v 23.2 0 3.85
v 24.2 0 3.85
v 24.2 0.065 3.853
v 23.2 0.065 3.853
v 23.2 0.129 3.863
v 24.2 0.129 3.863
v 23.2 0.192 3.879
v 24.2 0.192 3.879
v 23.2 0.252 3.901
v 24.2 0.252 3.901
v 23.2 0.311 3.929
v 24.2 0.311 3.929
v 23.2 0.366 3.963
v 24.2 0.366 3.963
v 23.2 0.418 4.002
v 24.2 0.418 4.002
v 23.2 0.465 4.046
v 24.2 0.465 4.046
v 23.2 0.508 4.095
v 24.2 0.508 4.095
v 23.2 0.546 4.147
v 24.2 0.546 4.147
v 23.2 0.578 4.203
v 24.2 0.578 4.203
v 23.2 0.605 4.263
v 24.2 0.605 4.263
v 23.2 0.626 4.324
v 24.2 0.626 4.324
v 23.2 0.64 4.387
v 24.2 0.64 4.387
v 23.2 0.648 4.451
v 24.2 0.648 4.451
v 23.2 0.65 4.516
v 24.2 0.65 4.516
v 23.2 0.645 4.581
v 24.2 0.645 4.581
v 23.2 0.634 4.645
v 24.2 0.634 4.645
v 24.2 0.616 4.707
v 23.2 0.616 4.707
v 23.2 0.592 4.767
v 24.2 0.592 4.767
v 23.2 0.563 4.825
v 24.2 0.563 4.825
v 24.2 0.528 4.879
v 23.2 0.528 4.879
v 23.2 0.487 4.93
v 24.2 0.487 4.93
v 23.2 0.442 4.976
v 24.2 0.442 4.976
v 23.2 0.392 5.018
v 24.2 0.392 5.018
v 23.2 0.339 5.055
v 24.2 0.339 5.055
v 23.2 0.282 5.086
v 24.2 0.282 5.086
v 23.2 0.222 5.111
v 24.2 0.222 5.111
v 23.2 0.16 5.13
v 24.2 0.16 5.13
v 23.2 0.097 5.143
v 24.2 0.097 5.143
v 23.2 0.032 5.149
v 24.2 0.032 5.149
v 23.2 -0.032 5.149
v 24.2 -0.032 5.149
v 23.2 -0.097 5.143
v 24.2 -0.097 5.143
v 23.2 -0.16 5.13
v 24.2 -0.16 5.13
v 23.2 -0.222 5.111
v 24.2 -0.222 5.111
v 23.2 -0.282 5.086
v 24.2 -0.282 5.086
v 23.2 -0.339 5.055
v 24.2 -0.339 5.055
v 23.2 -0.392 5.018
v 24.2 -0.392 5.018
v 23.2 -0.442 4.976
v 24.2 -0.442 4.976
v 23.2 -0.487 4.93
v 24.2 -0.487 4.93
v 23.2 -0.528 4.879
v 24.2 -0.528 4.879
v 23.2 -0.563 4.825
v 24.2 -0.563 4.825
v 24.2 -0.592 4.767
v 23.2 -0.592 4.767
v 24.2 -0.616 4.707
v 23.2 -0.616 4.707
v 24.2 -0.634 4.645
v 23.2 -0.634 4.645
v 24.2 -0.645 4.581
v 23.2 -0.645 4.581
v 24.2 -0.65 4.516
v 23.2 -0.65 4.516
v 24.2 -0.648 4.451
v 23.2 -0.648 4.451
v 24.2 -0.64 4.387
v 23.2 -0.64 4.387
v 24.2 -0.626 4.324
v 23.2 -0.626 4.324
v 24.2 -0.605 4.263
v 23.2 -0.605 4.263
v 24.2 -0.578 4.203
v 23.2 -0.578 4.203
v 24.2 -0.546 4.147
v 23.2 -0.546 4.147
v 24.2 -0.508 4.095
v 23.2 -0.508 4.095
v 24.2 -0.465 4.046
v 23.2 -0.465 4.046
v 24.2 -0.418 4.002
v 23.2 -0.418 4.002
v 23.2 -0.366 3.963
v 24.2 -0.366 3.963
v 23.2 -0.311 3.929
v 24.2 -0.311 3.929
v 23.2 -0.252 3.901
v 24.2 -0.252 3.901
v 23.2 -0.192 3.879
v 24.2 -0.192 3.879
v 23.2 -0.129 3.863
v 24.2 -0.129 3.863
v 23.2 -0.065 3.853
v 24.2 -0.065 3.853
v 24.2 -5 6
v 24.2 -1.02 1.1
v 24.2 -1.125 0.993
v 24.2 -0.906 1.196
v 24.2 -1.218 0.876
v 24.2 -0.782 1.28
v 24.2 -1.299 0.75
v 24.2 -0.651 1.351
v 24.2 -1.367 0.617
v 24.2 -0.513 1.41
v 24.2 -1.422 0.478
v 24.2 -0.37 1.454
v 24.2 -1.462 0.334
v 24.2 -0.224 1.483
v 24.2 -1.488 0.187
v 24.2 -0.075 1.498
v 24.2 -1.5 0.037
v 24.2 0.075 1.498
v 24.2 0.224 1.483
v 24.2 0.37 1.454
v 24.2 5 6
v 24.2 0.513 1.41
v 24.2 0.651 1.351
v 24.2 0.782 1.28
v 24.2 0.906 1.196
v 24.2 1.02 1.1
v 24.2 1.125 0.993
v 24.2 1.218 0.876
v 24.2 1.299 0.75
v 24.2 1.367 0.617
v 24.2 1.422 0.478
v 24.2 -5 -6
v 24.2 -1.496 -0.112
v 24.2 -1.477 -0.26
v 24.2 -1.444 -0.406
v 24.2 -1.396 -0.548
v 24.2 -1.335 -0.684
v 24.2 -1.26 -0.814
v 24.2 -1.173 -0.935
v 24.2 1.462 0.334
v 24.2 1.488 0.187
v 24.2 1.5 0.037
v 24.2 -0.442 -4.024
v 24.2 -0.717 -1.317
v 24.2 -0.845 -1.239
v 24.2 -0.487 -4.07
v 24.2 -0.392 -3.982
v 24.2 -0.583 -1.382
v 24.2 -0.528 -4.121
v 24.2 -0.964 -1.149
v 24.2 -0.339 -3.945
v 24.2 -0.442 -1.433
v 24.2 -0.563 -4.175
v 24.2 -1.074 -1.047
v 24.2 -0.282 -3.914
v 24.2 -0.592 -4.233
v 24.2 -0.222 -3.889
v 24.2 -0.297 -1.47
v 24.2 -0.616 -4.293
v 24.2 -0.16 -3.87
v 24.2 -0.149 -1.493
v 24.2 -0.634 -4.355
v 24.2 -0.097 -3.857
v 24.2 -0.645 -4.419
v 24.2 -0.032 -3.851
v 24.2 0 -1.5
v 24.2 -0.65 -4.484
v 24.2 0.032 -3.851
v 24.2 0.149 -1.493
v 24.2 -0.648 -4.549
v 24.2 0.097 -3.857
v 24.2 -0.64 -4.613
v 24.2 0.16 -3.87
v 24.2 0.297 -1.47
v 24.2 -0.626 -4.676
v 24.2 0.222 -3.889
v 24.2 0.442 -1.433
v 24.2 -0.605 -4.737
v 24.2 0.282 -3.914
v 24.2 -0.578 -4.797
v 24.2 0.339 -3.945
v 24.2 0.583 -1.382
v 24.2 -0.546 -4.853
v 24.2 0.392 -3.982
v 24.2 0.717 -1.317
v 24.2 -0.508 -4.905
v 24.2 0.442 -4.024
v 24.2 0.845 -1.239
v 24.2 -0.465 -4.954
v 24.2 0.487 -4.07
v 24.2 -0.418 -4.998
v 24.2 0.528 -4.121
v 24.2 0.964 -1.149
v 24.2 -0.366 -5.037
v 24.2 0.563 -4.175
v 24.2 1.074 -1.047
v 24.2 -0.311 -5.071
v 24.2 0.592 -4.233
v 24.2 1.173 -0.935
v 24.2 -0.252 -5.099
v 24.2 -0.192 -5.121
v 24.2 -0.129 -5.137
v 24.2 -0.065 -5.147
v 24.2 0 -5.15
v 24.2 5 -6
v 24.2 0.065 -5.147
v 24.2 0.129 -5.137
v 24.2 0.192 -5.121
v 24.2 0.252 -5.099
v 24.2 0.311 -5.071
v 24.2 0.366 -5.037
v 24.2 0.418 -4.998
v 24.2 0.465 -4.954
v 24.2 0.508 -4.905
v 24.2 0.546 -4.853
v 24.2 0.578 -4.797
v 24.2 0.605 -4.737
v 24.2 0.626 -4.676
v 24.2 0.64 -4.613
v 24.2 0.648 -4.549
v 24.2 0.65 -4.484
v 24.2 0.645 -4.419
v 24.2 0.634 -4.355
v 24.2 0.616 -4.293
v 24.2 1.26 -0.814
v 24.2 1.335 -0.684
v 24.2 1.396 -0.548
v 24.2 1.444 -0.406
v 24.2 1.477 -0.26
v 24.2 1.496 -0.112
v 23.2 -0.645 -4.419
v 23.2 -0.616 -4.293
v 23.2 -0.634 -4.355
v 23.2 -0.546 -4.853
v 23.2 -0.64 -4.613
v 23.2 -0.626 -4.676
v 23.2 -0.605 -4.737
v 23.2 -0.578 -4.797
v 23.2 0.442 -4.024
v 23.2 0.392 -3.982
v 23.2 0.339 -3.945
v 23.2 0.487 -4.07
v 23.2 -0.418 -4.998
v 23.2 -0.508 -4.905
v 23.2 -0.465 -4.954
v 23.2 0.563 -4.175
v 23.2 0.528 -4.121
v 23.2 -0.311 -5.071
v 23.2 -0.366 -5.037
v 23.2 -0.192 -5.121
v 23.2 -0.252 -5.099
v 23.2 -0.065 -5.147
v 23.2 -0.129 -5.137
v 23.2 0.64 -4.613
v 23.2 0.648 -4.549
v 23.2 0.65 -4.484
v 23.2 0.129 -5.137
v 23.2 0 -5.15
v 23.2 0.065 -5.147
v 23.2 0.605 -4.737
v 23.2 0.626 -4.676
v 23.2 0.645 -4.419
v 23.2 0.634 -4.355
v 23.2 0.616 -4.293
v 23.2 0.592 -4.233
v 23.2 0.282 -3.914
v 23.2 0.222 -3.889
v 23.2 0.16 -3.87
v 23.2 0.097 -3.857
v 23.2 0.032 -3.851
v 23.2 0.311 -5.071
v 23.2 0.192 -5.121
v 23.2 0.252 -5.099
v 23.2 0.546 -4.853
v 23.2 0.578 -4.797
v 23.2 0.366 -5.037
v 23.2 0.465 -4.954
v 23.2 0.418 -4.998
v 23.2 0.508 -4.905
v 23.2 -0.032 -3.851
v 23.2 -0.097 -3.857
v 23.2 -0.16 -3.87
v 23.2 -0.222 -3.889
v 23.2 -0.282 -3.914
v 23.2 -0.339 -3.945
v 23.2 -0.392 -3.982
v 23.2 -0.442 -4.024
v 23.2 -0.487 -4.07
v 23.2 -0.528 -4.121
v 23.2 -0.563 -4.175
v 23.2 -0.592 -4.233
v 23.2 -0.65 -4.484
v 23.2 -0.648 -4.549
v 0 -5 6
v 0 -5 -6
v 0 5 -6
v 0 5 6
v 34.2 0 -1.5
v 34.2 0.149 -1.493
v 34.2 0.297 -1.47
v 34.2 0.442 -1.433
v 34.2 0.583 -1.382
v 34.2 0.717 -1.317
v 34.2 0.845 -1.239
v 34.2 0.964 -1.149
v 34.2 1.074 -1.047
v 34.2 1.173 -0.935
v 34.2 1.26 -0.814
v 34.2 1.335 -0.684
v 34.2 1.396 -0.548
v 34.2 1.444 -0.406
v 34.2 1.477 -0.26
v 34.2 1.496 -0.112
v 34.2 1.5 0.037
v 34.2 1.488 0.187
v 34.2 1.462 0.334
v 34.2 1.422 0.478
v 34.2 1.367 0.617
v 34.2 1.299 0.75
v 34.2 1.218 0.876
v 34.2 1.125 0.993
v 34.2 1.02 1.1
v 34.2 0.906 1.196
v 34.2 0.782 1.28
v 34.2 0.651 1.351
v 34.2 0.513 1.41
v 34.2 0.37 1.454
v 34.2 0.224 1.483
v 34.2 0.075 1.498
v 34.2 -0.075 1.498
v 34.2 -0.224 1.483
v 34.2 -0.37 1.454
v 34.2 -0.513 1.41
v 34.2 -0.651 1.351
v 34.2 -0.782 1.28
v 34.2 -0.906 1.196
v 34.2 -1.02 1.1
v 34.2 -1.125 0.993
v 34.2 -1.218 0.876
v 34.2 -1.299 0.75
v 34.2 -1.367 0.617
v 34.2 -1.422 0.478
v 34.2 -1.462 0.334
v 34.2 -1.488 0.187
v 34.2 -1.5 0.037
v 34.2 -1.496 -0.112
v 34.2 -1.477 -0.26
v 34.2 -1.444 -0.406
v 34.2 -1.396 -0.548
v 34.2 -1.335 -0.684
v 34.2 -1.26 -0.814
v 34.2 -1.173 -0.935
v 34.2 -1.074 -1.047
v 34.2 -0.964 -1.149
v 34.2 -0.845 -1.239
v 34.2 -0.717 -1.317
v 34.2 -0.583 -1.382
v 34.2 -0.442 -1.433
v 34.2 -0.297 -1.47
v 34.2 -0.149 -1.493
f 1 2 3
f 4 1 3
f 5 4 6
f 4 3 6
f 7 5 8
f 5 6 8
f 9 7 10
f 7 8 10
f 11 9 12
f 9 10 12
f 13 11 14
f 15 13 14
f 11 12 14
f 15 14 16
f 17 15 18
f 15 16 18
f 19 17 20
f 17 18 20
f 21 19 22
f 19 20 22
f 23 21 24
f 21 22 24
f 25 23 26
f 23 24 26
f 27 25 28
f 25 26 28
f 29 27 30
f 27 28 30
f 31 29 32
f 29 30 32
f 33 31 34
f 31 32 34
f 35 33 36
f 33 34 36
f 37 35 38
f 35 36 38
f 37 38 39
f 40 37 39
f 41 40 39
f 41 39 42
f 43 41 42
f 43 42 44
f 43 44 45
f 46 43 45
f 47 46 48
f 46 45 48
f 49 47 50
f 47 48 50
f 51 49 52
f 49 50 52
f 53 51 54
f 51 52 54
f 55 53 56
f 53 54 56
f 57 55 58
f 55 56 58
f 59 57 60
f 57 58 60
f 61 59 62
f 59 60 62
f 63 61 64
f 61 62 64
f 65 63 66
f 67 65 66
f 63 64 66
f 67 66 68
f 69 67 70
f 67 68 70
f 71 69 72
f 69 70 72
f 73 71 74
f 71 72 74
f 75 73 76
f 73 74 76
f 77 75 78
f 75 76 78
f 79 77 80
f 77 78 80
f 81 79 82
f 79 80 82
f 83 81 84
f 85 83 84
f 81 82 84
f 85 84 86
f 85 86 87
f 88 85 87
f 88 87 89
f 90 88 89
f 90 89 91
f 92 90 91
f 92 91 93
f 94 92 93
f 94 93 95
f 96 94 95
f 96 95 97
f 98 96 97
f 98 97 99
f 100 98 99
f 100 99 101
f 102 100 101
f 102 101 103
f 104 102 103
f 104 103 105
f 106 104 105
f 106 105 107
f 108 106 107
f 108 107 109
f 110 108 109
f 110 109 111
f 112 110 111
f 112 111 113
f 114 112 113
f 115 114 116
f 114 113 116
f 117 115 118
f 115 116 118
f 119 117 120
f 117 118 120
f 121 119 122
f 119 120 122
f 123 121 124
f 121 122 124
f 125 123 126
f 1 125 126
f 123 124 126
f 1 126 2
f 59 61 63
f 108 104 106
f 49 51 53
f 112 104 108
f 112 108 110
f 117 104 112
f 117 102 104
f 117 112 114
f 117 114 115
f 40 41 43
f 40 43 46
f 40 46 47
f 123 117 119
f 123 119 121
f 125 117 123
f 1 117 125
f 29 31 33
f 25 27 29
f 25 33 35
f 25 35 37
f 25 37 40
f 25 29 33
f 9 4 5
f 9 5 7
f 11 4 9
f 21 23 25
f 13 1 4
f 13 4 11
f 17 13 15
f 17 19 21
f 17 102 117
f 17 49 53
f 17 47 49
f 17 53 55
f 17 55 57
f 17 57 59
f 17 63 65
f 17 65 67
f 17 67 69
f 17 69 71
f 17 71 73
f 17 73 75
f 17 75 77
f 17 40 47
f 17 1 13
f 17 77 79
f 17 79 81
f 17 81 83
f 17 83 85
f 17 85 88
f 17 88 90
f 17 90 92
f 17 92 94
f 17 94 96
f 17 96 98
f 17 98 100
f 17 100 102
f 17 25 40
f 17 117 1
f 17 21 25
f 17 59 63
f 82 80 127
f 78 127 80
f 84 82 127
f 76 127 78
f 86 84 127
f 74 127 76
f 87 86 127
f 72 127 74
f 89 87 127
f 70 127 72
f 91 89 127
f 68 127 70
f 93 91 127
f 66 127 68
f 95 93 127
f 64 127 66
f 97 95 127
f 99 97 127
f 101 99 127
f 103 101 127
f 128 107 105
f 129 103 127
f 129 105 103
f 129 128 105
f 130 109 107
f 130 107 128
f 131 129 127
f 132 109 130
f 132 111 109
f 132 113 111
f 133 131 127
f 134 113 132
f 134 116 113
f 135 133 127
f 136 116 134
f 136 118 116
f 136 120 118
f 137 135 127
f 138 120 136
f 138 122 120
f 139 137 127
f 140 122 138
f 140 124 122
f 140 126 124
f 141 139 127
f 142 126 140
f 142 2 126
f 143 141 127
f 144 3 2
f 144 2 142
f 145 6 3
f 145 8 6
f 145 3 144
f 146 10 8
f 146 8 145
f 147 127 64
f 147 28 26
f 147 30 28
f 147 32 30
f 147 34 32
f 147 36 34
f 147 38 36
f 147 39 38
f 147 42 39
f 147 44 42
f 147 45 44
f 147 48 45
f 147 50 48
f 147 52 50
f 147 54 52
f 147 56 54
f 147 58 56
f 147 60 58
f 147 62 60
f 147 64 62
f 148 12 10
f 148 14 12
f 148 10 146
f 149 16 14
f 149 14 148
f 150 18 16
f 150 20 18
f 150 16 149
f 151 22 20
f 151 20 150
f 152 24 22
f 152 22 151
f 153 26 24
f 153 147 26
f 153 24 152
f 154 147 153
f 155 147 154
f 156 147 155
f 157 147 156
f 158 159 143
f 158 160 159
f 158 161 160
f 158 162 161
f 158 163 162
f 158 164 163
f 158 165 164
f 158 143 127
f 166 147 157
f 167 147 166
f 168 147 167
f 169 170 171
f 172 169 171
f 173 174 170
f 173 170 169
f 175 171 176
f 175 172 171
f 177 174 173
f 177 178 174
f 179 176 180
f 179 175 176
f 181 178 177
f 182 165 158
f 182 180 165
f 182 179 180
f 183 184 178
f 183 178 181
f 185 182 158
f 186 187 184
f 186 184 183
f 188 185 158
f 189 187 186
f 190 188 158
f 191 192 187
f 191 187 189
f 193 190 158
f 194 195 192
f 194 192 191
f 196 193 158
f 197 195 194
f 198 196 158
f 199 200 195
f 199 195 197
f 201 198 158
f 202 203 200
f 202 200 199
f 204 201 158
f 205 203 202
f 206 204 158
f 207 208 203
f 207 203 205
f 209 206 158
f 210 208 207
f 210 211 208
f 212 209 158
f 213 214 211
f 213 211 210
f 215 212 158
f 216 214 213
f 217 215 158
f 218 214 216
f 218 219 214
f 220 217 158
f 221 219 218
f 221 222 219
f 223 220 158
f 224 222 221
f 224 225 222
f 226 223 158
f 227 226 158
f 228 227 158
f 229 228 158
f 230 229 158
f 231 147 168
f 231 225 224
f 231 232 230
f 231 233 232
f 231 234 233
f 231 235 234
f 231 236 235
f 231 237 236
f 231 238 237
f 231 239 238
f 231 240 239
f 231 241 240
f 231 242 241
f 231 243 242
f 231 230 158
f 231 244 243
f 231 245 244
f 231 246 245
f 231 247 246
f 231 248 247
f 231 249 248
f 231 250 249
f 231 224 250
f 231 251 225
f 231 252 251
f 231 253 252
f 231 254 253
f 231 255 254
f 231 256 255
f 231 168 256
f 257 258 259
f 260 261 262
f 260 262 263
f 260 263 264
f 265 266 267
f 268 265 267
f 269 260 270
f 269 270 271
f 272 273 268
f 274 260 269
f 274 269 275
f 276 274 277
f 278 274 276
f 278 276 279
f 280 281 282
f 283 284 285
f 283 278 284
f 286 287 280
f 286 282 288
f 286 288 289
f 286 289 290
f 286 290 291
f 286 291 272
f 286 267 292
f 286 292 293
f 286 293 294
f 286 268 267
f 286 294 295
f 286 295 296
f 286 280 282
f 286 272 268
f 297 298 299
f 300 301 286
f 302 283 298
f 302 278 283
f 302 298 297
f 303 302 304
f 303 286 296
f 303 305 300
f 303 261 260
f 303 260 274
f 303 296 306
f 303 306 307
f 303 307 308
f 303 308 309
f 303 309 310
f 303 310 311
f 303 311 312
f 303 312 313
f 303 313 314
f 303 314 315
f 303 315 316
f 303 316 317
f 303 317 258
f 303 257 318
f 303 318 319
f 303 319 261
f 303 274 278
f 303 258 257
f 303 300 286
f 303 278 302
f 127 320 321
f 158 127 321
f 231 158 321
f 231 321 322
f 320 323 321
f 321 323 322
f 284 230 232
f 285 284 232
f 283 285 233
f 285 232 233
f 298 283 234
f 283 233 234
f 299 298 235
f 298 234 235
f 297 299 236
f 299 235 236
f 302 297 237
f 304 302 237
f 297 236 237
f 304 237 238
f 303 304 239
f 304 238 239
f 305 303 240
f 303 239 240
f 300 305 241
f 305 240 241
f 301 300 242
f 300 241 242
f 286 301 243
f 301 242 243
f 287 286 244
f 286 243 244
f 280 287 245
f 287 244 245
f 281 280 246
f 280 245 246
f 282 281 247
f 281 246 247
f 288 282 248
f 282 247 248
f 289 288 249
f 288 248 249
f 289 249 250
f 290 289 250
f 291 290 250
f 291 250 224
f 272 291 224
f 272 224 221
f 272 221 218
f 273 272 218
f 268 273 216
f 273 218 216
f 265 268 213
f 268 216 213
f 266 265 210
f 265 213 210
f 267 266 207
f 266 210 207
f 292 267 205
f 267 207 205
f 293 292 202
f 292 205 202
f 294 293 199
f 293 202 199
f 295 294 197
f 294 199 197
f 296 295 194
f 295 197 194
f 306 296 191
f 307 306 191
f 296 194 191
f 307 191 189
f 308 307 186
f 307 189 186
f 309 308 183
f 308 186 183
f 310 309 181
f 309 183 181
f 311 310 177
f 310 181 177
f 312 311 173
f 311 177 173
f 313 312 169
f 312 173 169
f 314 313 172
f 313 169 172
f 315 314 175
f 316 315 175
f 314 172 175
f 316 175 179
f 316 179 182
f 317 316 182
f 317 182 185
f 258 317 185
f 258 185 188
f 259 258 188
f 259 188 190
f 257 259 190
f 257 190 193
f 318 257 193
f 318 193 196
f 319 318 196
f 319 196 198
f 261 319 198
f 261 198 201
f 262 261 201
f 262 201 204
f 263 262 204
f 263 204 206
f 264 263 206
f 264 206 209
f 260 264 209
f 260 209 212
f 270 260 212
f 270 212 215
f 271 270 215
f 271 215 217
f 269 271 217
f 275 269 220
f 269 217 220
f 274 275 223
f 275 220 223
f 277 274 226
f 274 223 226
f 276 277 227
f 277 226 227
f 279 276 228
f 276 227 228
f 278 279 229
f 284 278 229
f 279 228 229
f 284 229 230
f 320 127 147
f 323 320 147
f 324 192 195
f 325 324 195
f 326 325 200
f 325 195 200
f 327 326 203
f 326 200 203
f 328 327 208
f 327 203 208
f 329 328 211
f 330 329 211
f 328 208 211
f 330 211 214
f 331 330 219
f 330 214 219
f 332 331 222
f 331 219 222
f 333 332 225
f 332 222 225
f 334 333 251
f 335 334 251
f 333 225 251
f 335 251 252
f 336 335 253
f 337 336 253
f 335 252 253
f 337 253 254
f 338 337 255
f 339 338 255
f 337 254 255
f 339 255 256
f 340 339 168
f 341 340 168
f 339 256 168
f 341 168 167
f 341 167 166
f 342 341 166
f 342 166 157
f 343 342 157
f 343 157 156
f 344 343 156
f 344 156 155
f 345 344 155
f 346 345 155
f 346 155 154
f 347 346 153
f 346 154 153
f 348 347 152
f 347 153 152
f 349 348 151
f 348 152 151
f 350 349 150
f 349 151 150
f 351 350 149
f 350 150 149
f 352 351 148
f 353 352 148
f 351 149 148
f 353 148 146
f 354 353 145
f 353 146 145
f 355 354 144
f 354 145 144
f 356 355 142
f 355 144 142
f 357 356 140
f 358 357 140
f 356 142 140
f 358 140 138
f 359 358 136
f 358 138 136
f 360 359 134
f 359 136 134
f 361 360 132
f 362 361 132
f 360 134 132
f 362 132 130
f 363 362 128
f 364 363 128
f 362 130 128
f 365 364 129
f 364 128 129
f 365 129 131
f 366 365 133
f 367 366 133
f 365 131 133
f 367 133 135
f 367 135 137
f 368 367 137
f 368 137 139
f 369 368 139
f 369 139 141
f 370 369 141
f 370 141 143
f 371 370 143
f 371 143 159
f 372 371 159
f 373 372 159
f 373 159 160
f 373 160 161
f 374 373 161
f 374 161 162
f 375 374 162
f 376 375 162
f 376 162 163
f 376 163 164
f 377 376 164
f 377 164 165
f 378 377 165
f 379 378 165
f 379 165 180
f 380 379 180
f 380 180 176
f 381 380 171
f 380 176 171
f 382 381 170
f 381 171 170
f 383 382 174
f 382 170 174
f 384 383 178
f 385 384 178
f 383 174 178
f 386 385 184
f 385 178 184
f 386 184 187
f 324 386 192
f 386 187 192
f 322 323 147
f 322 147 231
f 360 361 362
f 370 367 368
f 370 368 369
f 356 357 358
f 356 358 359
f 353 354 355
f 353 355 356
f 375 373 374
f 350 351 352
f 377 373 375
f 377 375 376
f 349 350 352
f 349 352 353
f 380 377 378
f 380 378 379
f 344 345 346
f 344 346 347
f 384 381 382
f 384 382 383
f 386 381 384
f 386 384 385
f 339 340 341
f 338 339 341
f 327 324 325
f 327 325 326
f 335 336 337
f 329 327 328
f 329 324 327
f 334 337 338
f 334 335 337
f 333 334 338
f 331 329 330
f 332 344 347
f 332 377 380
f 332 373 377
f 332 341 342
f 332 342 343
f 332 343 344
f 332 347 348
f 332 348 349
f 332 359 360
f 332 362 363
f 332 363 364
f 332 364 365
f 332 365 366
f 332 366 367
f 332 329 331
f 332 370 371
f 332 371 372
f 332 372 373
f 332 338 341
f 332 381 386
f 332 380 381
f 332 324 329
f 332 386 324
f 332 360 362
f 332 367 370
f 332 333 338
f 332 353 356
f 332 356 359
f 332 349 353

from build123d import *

# Parameters (mm, degrees)
SKETCH1_W           = 12
SKETCH1_H           = 10
BOSS_EXTRUDE1_DEPTH = 24.2
SKETCH2_R           = 1.5
BOSS_EXTRUDE2_DEPTH = 10
SKETCH3_R           = 0.65
CUT_EXTRUDE1_DEPTH  = 1


with BuildPart() as part:
    # Sketch1 → Boss-Extrude1 (new body)
    with BuildSketch(Plane(origin=(0, 0, 0), x_dir=(0, 0, -1), z_dir=(1, 0, 0))):
        Rectangle(SKETCH1_W, SKETCH1_H)
    extrude(amount=BOSS_EXTRUDE1_DEPTH)

    # Sketch2 → Boss-Extrude2 (add)
    with BuildSketch(Plane(origin=(24.2, 0, 0), x_dir=(0, 0, -1), z_dir=(1, 0, 0))):
        Circle(SKETCH2_R)
    extrude(amount=BOSS_EXTRUDE2_DEPTH)

    # Sketch3 → Cut-Extrude1 (cut)
    with BuildSketch(Plane(origin=(24.2, 0, 0), x_dir=(0, 0, -1), z_dir=(1, 0, 0))):
        with Locations((-4.5, 0)):
            Circle(SKETCH3_R)
        with Locations((4.5, 0)):
            Circle(SKETCH3_R)
    extrude(amount=-CUT_EXTRUDE1_DEPTH, mode=Mode.SUBTRACT)


solid = part.part
